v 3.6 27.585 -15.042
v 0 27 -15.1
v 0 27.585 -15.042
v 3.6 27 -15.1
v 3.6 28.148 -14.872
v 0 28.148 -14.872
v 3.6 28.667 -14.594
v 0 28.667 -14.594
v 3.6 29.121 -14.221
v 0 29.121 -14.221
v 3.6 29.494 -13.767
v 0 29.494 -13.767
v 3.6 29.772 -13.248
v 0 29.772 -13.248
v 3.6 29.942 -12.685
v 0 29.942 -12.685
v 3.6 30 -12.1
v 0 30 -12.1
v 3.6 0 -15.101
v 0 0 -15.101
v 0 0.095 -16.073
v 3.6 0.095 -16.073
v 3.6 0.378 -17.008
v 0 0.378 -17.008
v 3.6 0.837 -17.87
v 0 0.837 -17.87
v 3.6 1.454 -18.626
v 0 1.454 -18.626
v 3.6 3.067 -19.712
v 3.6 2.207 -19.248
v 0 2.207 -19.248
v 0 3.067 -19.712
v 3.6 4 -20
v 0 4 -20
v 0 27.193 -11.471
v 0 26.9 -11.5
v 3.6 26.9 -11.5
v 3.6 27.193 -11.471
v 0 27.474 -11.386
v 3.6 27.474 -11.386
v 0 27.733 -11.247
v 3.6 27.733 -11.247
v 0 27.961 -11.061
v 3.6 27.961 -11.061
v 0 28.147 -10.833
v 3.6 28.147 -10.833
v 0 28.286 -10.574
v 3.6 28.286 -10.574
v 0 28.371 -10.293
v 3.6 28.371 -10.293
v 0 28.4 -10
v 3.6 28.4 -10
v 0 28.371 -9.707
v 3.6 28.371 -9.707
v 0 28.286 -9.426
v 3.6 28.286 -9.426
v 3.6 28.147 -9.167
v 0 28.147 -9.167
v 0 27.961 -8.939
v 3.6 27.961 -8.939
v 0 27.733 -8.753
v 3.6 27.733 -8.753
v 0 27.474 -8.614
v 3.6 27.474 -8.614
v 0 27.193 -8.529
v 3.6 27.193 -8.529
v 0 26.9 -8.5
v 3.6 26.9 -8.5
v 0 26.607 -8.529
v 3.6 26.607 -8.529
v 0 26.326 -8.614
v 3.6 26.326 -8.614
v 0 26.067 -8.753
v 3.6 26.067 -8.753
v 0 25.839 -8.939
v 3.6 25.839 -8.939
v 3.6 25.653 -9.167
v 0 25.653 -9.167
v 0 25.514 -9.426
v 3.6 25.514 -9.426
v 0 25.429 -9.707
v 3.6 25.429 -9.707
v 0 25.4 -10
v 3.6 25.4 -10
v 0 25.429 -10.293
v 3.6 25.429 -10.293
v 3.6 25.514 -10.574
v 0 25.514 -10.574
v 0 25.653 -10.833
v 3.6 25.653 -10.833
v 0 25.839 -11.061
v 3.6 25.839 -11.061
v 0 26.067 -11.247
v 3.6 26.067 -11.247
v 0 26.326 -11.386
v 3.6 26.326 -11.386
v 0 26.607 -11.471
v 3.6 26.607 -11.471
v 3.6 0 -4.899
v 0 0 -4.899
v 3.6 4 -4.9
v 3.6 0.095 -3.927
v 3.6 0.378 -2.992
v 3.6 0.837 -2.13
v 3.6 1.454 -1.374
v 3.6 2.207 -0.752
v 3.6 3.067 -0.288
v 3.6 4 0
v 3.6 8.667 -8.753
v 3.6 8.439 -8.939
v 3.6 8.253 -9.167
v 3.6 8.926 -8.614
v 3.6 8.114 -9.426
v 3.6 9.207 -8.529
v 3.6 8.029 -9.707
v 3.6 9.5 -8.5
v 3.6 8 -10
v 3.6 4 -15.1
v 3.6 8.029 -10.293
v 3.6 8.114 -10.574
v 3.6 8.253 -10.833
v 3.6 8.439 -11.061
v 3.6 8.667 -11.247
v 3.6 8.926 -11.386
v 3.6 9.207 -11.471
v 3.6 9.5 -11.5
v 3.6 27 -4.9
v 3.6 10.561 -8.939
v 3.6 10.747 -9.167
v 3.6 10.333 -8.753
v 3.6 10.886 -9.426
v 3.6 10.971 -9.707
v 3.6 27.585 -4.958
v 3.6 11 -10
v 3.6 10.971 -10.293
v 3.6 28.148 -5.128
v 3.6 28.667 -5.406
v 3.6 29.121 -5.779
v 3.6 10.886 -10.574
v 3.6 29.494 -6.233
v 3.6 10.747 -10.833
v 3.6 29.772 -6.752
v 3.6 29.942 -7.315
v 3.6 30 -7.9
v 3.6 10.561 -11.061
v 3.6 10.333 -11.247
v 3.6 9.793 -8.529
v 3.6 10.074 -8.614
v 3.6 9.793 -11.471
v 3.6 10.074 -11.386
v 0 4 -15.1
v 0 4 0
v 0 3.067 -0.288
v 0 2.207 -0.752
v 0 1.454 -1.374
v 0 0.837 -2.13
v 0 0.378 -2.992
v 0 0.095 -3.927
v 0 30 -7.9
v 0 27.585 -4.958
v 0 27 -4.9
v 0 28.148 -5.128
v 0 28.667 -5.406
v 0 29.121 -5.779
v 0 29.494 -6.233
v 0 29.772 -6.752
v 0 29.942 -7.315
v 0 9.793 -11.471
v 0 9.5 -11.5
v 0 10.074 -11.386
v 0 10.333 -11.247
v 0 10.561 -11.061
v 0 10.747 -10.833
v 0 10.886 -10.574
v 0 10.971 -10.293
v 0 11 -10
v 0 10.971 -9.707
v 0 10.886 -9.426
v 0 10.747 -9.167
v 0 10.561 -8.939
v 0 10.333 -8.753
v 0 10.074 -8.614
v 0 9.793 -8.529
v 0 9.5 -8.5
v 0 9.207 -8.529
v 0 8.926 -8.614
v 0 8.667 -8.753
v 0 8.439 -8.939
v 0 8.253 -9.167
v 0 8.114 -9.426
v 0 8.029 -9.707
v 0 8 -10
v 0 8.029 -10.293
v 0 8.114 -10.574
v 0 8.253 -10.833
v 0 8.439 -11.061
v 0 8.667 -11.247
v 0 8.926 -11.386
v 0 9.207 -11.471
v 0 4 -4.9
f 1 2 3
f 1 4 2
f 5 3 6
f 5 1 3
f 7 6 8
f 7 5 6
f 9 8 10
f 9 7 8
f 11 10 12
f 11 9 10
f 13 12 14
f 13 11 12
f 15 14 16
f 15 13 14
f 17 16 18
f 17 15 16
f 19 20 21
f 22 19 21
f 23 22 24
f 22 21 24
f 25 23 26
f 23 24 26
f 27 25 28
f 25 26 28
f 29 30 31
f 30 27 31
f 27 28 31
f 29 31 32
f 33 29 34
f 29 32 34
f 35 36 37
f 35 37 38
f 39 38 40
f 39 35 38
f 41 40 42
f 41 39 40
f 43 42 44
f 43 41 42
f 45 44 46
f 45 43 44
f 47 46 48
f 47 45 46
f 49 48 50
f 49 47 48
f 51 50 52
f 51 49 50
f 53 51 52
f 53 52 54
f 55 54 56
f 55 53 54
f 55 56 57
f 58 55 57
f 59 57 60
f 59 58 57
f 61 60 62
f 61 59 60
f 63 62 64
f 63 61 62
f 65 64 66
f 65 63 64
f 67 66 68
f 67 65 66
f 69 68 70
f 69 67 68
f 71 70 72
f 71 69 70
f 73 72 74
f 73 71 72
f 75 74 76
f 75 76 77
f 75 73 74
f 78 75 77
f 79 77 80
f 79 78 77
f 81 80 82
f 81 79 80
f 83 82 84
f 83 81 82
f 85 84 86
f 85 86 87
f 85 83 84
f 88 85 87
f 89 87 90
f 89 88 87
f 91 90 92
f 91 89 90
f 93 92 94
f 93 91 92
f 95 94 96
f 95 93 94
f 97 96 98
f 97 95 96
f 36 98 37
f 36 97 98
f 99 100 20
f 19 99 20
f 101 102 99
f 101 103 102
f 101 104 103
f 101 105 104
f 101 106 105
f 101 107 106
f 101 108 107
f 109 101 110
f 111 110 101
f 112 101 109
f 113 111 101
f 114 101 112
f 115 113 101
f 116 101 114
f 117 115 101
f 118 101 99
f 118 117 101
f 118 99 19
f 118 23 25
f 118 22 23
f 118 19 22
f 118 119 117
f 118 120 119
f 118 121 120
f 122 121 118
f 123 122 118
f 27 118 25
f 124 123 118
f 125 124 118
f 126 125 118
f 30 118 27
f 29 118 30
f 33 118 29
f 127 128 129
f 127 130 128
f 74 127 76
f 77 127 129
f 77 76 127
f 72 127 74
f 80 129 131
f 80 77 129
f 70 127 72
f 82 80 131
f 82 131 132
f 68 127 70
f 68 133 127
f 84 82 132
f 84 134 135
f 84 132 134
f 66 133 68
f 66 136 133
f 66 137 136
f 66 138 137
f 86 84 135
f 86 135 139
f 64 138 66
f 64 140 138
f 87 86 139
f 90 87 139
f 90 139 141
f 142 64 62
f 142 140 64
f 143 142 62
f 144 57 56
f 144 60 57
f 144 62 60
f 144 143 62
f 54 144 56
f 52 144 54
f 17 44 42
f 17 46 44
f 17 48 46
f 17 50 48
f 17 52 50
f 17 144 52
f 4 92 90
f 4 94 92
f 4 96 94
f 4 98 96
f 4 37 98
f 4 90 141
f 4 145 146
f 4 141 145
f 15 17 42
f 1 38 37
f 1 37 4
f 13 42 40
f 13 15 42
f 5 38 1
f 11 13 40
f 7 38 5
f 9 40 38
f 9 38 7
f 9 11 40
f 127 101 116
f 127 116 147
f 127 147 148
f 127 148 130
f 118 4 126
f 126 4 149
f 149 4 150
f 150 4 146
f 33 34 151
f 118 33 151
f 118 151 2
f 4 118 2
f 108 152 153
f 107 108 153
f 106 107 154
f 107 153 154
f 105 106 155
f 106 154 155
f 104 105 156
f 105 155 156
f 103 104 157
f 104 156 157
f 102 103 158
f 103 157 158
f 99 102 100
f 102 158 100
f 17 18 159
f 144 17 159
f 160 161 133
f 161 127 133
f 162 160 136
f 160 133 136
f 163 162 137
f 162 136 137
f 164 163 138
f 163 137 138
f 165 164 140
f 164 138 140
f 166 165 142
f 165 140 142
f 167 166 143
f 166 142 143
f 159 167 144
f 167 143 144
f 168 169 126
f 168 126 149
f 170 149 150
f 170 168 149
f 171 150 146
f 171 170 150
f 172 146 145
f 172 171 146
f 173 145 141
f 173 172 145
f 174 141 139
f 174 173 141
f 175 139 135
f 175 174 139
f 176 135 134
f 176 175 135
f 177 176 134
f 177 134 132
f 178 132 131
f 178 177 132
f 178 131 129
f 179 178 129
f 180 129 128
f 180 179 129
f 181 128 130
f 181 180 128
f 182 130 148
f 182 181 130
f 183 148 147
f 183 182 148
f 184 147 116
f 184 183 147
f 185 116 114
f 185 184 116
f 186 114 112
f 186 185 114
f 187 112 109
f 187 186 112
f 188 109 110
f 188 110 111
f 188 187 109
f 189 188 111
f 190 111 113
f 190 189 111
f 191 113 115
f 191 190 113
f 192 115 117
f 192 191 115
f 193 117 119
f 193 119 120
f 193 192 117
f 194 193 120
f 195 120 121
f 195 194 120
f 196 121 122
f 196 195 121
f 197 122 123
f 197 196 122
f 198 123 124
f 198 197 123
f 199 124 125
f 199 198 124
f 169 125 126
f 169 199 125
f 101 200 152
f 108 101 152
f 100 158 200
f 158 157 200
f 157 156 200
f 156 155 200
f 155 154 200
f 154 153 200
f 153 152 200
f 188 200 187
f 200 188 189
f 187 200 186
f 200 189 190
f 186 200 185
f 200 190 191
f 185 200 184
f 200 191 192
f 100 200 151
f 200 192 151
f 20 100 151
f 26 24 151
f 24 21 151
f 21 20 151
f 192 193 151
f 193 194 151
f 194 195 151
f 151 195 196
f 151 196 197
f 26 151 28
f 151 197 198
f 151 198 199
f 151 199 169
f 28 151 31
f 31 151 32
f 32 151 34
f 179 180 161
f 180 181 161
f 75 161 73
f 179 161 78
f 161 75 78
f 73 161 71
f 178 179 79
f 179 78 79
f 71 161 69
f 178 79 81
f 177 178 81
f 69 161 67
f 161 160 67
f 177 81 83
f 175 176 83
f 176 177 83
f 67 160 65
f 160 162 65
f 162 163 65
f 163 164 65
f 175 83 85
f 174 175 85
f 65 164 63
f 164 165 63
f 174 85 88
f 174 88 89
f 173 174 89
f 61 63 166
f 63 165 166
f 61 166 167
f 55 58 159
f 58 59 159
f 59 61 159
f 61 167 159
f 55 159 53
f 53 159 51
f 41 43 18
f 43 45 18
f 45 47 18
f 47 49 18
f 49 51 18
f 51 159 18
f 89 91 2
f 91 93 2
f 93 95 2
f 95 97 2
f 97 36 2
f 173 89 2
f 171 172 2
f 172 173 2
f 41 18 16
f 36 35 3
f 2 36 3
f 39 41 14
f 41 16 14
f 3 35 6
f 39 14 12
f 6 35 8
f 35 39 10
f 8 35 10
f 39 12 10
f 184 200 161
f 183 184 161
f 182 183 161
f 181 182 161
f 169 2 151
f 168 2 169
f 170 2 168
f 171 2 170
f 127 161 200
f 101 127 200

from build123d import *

# Parameters (mm, degrees)
ESBO_O1_R                = 1.5
RESSALTO_EXTRUS_O1_DEPTH = 3.6
FILETE1_R                = 3
FILETE2_R                = 5


with BuildPart() as part:
    # Esboço1 → Ressalto-extrusão1 (new body)
    with BuildSketch(Plane(origin=(0, 0, 0), x_dir=(0, 0, -1), z_dir=(1, 0, 0))):
        Polygon((0, 0), (20, 0), (20, 4), (15.1, 4), (15.1, 30), (4.9, 30), (4.9, 4), (0, 4), align=None)
        with Locations((10, 26.9)):
            Circle(ESBO_O1_R, mode=Mode.SUBTRACT)
        with Locations((10, 9.5)):
            Circle(ESBO_O1_R, mode=Mode.SUBTRACT)
    extrude(amount=RESSALTO_EXTRUS_O1_DEPTH)

    # Filete1
    filete1_edges = [part.edges().sort_by_distance(p)[0] for p in [
        (1.8, 30, -4.9),
        (1.8, 30, -15.1),
    ]]
    fillet(filete1_edges, radius=FILETE1_R)

    # Filete2
    # the kernel refuses this fillet: 5 mm, written as the material it takes off along each edge
    with BuildSketch(Plane(origin=(-12.247448714, 0, 0), x_dir=(0, 0, -1), z_dir=(1, 0, 0))) as filete2_piece_1:
        with BuildLine():
            CenterArc((4.898979486, 5), FILETE2_R, 191.536959033, 78.463040967)
            Line((0, 4), (-0.09797959, 3.98))
            ThreePointArc((-0.09797959, 3.98), (-0.1, 2), (-0.1, 0))
            Line((-0.1, 0), (0, -0.1))
            Line((0, -0.1), (4.898979486, -0.1))
            Line((4.898979486, -0.1), (4.898979486, 0))
        make_face()
    extrude(amount=28.094897428, mode=Mode.SUBTRACT)
    with BuildSketch(Plane(origin=(-12.247448714, 0, -20), x_dir=(0, 1.0, 1.5667467323505199e-12), z_dir=(1, 0, 0))) as filete2_piece_2:
        with BuildLine():
            CenterArc((5, 4.898979486), FILETE2_R, 180, 78.463040967)
            Line((0, 4.898979486), (-0.1, 4.898979486))
            Line((-0.1, 4.898979486), (-0.1, 0))
            Line((-0.1, 0), (0, -0.1))
            ThreePointArc((0, -0.1), (2, -0.1), (3.98, -0.09797959))
            Line((3.98, -0.09797959), (4, 0))
        make_face()
    extrude(amount=28.094897428, mode=Mode.SUBTRACT)


solid = part.part
